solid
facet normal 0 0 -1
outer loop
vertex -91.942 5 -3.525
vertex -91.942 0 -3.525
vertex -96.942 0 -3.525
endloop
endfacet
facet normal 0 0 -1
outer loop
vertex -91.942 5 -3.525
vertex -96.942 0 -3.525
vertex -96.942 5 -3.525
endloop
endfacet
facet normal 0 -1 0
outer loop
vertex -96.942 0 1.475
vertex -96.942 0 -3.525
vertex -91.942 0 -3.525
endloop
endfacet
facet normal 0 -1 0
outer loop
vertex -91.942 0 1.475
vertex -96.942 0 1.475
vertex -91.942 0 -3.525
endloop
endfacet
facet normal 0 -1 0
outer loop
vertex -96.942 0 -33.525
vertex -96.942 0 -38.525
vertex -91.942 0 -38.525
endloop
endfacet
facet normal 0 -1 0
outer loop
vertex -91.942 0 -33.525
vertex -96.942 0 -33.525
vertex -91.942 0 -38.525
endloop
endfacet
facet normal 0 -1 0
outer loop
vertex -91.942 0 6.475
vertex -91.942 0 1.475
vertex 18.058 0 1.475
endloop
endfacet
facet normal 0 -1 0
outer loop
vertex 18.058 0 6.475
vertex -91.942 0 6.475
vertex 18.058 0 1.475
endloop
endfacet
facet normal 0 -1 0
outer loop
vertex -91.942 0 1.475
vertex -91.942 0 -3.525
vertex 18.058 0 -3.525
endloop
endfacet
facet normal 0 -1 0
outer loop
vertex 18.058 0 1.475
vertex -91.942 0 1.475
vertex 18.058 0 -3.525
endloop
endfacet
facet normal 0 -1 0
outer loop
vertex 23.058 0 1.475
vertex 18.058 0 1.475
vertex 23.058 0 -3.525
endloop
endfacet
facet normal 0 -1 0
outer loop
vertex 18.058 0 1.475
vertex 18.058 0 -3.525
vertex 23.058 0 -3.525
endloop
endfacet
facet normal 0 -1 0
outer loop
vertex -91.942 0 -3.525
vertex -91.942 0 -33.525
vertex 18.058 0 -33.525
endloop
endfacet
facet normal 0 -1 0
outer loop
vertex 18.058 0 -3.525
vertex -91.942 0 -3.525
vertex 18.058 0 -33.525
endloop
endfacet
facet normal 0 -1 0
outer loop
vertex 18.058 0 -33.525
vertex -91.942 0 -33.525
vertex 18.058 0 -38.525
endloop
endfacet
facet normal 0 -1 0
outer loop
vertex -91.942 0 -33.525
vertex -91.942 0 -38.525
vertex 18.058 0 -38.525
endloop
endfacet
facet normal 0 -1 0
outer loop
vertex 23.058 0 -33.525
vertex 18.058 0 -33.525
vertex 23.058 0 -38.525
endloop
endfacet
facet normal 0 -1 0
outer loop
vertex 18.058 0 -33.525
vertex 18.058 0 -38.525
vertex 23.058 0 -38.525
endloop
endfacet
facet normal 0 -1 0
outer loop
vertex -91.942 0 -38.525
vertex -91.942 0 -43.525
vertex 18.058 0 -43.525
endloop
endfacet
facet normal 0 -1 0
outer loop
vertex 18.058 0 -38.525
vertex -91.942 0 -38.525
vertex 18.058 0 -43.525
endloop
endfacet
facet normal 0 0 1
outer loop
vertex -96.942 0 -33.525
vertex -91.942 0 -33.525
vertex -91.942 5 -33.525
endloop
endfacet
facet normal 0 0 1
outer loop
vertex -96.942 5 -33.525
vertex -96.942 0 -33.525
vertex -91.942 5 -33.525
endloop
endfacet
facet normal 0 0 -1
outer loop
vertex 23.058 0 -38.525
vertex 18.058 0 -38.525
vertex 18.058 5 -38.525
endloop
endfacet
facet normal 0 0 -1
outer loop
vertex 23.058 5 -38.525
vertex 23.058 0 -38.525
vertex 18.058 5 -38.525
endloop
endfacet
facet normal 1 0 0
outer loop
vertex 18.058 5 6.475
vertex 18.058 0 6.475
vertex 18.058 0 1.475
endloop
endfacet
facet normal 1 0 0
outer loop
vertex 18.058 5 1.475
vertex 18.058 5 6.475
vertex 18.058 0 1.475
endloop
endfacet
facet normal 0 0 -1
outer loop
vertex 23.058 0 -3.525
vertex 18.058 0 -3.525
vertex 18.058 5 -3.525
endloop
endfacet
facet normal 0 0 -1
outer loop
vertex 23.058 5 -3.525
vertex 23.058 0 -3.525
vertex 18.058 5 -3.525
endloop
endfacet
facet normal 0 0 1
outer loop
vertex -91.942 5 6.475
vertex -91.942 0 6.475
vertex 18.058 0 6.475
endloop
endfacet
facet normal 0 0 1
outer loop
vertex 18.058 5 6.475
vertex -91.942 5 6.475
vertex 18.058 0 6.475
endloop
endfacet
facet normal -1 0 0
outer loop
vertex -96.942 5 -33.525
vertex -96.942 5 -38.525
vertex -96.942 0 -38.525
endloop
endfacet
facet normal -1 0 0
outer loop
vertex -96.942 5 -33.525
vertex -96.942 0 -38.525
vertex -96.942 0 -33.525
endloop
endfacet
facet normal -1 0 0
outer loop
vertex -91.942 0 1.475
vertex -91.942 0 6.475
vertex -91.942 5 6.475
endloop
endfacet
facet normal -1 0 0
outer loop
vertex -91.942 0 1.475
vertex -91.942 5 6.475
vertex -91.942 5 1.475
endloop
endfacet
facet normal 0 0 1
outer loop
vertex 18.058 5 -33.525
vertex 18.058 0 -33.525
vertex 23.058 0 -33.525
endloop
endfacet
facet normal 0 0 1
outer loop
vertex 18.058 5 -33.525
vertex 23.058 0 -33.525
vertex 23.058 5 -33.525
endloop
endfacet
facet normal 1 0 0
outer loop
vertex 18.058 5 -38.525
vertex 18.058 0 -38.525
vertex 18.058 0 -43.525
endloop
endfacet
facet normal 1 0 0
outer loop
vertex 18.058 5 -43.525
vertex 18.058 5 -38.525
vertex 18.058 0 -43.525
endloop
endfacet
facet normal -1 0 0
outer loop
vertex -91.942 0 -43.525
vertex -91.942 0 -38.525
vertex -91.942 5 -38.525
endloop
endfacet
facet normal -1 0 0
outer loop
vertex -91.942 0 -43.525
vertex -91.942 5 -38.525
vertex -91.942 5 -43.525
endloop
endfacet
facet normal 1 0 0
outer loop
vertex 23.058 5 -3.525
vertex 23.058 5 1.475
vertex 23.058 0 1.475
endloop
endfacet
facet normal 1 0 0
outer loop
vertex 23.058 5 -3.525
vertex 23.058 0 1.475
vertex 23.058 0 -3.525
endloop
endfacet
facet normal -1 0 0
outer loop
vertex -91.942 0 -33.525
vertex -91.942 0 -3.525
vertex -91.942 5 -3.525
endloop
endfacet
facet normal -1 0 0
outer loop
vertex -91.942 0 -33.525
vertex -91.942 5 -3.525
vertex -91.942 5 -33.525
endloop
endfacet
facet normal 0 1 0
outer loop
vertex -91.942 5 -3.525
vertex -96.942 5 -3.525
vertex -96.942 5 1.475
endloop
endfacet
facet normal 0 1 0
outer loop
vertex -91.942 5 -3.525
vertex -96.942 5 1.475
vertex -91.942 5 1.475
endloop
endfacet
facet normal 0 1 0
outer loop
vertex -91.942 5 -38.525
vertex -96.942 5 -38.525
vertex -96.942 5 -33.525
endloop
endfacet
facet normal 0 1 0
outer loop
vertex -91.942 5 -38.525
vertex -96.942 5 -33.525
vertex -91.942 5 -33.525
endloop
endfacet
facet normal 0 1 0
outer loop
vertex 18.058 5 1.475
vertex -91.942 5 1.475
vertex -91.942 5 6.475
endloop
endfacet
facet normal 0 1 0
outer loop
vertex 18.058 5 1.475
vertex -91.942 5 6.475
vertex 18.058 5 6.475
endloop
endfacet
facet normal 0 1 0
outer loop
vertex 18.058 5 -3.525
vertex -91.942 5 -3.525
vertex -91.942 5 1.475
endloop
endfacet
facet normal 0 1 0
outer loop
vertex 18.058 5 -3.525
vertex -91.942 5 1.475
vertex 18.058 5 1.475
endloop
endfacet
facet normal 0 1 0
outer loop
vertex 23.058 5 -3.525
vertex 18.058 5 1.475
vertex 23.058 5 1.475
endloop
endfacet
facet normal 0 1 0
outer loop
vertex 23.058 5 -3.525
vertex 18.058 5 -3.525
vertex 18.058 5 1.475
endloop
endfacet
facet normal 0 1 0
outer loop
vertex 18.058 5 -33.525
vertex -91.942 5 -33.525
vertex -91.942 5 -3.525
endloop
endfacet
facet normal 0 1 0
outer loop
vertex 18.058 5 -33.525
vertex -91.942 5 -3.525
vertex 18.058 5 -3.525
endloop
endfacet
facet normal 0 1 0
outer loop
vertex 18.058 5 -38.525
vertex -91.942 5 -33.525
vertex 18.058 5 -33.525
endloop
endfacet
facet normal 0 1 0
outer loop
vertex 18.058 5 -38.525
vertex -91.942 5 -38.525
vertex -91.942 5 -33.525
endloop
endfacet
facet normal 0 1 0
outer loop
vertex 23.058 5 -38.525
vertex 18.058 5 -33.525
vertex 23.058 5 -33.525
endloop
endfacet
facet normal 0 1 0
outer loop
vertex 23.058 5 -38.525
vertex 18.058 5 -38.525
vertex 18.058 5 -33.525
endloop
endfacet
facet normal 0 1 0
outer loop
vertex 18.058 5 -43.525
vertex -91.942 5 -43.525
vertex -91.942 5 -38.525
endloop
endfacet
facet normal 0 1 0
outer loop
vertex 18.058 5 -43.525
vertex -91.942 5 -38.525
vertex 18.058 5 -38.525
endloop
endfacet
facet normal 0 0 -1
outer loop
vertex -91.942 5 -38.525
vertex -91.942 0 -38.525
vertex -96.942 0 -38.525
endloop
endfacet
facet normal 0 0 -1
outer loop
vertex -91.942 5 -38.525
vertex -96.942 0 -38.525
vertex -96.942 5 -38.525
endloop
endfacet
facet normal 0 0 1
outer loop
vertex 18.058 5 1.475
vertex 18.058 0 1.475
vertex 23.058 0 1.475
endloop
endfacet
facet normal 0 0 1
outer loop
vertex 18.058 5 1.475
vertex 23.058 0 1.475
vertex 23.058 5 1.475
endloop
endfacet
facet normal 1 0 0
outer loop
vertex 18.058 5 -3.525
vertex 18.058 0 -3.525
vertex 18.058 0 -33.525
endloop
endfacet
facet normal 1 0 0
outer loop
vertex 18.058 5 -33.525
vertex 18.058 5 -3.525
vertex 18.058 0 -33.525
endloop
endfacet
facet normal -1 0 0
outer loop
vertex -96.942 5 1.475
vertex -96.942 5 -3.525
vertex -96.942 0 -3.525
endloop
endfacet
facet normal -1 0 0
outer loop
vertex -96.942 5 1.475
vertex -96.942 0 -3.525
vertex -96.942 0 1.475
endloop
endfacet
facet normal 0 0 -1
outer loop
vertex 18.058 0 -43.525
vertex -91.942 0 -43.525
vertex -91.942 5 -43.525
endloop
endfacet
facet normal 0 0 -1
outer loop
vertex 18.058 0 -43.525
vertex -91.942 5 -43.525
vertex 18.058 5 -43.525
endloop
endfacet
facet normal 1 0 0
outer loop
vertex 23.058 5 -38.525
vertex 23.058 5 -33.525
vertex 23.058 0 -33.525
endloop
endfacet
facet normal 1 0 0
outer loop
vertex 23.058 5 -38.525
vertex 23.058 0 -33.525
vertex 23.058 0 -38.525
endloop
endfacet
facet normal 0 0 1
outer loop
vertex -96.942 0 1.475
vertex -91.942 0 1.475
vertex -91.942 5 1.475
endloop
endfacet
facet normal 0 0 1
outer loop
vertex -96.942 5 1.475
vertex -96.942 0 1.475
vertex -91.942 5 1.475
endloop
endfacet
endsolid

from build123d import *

# Parameters (mm, degrees)
SKETCH2_W           = 110
SKETCH2_H           = 50
BOSS_EXTRUDE1_DEPTH = 5
SKETCH3_W           = 5
SKETCH3_H           = 5
BOSS_EXTRUDE2_DEPTH = 5
SKETCH4_W           = 5
SKETCH4_H           = 5
BOSS_EXTRUDE3_DEPTH = 5


with BuildPart() as part:
    # Sketch2 → Boss-Extrude1 (new body)
    with BuildSketch(Plane(origin=(0, 0, 0), x_dir=(1, 0, 0), z_dir=(0, 1, 0))):
        with Locations((-36.942060086, 18.524678112)):
            Rectangle(SKETCH2_W, SKETCH2_H)
    extrude(amount=BOSS_EXTRUDE1_DEPTH)

    # Sketch3 → Boss-Extrude2 (add)
    with BuildSketch(Plane.ZY.offset(91.942060086)):
        with Locations((-36.024678112, 2.5)):
            Rectangle(SKETCH3_W, SKETCH3_H)
        with Locations((-1.024678112, 2.5)):
            Rectangle(SKETCH3_W, SKETCH3_H)
    extrude(amount=BOSS_EXTRUDE2_DEPTH)

    # Sketch4 → Boss-Extrude3 (add)
    with BuildSketch(Plane(origin=(18.057939914, 0, 0), x_dir=(0, 0, -1), z_dir=(1, 0, 0))):
        with Locations((36.024678112, 2.5)):
            Rectangle(SKETCH4_W, SKETCH4_H)
        with Locations((1.024678112, 2.5)):
            Rectangle(SKETCH4_W, SKETCH4_H)
    extrude(amount=BOSS_EXTRUDE3_DEPTH)


solid = part.part
